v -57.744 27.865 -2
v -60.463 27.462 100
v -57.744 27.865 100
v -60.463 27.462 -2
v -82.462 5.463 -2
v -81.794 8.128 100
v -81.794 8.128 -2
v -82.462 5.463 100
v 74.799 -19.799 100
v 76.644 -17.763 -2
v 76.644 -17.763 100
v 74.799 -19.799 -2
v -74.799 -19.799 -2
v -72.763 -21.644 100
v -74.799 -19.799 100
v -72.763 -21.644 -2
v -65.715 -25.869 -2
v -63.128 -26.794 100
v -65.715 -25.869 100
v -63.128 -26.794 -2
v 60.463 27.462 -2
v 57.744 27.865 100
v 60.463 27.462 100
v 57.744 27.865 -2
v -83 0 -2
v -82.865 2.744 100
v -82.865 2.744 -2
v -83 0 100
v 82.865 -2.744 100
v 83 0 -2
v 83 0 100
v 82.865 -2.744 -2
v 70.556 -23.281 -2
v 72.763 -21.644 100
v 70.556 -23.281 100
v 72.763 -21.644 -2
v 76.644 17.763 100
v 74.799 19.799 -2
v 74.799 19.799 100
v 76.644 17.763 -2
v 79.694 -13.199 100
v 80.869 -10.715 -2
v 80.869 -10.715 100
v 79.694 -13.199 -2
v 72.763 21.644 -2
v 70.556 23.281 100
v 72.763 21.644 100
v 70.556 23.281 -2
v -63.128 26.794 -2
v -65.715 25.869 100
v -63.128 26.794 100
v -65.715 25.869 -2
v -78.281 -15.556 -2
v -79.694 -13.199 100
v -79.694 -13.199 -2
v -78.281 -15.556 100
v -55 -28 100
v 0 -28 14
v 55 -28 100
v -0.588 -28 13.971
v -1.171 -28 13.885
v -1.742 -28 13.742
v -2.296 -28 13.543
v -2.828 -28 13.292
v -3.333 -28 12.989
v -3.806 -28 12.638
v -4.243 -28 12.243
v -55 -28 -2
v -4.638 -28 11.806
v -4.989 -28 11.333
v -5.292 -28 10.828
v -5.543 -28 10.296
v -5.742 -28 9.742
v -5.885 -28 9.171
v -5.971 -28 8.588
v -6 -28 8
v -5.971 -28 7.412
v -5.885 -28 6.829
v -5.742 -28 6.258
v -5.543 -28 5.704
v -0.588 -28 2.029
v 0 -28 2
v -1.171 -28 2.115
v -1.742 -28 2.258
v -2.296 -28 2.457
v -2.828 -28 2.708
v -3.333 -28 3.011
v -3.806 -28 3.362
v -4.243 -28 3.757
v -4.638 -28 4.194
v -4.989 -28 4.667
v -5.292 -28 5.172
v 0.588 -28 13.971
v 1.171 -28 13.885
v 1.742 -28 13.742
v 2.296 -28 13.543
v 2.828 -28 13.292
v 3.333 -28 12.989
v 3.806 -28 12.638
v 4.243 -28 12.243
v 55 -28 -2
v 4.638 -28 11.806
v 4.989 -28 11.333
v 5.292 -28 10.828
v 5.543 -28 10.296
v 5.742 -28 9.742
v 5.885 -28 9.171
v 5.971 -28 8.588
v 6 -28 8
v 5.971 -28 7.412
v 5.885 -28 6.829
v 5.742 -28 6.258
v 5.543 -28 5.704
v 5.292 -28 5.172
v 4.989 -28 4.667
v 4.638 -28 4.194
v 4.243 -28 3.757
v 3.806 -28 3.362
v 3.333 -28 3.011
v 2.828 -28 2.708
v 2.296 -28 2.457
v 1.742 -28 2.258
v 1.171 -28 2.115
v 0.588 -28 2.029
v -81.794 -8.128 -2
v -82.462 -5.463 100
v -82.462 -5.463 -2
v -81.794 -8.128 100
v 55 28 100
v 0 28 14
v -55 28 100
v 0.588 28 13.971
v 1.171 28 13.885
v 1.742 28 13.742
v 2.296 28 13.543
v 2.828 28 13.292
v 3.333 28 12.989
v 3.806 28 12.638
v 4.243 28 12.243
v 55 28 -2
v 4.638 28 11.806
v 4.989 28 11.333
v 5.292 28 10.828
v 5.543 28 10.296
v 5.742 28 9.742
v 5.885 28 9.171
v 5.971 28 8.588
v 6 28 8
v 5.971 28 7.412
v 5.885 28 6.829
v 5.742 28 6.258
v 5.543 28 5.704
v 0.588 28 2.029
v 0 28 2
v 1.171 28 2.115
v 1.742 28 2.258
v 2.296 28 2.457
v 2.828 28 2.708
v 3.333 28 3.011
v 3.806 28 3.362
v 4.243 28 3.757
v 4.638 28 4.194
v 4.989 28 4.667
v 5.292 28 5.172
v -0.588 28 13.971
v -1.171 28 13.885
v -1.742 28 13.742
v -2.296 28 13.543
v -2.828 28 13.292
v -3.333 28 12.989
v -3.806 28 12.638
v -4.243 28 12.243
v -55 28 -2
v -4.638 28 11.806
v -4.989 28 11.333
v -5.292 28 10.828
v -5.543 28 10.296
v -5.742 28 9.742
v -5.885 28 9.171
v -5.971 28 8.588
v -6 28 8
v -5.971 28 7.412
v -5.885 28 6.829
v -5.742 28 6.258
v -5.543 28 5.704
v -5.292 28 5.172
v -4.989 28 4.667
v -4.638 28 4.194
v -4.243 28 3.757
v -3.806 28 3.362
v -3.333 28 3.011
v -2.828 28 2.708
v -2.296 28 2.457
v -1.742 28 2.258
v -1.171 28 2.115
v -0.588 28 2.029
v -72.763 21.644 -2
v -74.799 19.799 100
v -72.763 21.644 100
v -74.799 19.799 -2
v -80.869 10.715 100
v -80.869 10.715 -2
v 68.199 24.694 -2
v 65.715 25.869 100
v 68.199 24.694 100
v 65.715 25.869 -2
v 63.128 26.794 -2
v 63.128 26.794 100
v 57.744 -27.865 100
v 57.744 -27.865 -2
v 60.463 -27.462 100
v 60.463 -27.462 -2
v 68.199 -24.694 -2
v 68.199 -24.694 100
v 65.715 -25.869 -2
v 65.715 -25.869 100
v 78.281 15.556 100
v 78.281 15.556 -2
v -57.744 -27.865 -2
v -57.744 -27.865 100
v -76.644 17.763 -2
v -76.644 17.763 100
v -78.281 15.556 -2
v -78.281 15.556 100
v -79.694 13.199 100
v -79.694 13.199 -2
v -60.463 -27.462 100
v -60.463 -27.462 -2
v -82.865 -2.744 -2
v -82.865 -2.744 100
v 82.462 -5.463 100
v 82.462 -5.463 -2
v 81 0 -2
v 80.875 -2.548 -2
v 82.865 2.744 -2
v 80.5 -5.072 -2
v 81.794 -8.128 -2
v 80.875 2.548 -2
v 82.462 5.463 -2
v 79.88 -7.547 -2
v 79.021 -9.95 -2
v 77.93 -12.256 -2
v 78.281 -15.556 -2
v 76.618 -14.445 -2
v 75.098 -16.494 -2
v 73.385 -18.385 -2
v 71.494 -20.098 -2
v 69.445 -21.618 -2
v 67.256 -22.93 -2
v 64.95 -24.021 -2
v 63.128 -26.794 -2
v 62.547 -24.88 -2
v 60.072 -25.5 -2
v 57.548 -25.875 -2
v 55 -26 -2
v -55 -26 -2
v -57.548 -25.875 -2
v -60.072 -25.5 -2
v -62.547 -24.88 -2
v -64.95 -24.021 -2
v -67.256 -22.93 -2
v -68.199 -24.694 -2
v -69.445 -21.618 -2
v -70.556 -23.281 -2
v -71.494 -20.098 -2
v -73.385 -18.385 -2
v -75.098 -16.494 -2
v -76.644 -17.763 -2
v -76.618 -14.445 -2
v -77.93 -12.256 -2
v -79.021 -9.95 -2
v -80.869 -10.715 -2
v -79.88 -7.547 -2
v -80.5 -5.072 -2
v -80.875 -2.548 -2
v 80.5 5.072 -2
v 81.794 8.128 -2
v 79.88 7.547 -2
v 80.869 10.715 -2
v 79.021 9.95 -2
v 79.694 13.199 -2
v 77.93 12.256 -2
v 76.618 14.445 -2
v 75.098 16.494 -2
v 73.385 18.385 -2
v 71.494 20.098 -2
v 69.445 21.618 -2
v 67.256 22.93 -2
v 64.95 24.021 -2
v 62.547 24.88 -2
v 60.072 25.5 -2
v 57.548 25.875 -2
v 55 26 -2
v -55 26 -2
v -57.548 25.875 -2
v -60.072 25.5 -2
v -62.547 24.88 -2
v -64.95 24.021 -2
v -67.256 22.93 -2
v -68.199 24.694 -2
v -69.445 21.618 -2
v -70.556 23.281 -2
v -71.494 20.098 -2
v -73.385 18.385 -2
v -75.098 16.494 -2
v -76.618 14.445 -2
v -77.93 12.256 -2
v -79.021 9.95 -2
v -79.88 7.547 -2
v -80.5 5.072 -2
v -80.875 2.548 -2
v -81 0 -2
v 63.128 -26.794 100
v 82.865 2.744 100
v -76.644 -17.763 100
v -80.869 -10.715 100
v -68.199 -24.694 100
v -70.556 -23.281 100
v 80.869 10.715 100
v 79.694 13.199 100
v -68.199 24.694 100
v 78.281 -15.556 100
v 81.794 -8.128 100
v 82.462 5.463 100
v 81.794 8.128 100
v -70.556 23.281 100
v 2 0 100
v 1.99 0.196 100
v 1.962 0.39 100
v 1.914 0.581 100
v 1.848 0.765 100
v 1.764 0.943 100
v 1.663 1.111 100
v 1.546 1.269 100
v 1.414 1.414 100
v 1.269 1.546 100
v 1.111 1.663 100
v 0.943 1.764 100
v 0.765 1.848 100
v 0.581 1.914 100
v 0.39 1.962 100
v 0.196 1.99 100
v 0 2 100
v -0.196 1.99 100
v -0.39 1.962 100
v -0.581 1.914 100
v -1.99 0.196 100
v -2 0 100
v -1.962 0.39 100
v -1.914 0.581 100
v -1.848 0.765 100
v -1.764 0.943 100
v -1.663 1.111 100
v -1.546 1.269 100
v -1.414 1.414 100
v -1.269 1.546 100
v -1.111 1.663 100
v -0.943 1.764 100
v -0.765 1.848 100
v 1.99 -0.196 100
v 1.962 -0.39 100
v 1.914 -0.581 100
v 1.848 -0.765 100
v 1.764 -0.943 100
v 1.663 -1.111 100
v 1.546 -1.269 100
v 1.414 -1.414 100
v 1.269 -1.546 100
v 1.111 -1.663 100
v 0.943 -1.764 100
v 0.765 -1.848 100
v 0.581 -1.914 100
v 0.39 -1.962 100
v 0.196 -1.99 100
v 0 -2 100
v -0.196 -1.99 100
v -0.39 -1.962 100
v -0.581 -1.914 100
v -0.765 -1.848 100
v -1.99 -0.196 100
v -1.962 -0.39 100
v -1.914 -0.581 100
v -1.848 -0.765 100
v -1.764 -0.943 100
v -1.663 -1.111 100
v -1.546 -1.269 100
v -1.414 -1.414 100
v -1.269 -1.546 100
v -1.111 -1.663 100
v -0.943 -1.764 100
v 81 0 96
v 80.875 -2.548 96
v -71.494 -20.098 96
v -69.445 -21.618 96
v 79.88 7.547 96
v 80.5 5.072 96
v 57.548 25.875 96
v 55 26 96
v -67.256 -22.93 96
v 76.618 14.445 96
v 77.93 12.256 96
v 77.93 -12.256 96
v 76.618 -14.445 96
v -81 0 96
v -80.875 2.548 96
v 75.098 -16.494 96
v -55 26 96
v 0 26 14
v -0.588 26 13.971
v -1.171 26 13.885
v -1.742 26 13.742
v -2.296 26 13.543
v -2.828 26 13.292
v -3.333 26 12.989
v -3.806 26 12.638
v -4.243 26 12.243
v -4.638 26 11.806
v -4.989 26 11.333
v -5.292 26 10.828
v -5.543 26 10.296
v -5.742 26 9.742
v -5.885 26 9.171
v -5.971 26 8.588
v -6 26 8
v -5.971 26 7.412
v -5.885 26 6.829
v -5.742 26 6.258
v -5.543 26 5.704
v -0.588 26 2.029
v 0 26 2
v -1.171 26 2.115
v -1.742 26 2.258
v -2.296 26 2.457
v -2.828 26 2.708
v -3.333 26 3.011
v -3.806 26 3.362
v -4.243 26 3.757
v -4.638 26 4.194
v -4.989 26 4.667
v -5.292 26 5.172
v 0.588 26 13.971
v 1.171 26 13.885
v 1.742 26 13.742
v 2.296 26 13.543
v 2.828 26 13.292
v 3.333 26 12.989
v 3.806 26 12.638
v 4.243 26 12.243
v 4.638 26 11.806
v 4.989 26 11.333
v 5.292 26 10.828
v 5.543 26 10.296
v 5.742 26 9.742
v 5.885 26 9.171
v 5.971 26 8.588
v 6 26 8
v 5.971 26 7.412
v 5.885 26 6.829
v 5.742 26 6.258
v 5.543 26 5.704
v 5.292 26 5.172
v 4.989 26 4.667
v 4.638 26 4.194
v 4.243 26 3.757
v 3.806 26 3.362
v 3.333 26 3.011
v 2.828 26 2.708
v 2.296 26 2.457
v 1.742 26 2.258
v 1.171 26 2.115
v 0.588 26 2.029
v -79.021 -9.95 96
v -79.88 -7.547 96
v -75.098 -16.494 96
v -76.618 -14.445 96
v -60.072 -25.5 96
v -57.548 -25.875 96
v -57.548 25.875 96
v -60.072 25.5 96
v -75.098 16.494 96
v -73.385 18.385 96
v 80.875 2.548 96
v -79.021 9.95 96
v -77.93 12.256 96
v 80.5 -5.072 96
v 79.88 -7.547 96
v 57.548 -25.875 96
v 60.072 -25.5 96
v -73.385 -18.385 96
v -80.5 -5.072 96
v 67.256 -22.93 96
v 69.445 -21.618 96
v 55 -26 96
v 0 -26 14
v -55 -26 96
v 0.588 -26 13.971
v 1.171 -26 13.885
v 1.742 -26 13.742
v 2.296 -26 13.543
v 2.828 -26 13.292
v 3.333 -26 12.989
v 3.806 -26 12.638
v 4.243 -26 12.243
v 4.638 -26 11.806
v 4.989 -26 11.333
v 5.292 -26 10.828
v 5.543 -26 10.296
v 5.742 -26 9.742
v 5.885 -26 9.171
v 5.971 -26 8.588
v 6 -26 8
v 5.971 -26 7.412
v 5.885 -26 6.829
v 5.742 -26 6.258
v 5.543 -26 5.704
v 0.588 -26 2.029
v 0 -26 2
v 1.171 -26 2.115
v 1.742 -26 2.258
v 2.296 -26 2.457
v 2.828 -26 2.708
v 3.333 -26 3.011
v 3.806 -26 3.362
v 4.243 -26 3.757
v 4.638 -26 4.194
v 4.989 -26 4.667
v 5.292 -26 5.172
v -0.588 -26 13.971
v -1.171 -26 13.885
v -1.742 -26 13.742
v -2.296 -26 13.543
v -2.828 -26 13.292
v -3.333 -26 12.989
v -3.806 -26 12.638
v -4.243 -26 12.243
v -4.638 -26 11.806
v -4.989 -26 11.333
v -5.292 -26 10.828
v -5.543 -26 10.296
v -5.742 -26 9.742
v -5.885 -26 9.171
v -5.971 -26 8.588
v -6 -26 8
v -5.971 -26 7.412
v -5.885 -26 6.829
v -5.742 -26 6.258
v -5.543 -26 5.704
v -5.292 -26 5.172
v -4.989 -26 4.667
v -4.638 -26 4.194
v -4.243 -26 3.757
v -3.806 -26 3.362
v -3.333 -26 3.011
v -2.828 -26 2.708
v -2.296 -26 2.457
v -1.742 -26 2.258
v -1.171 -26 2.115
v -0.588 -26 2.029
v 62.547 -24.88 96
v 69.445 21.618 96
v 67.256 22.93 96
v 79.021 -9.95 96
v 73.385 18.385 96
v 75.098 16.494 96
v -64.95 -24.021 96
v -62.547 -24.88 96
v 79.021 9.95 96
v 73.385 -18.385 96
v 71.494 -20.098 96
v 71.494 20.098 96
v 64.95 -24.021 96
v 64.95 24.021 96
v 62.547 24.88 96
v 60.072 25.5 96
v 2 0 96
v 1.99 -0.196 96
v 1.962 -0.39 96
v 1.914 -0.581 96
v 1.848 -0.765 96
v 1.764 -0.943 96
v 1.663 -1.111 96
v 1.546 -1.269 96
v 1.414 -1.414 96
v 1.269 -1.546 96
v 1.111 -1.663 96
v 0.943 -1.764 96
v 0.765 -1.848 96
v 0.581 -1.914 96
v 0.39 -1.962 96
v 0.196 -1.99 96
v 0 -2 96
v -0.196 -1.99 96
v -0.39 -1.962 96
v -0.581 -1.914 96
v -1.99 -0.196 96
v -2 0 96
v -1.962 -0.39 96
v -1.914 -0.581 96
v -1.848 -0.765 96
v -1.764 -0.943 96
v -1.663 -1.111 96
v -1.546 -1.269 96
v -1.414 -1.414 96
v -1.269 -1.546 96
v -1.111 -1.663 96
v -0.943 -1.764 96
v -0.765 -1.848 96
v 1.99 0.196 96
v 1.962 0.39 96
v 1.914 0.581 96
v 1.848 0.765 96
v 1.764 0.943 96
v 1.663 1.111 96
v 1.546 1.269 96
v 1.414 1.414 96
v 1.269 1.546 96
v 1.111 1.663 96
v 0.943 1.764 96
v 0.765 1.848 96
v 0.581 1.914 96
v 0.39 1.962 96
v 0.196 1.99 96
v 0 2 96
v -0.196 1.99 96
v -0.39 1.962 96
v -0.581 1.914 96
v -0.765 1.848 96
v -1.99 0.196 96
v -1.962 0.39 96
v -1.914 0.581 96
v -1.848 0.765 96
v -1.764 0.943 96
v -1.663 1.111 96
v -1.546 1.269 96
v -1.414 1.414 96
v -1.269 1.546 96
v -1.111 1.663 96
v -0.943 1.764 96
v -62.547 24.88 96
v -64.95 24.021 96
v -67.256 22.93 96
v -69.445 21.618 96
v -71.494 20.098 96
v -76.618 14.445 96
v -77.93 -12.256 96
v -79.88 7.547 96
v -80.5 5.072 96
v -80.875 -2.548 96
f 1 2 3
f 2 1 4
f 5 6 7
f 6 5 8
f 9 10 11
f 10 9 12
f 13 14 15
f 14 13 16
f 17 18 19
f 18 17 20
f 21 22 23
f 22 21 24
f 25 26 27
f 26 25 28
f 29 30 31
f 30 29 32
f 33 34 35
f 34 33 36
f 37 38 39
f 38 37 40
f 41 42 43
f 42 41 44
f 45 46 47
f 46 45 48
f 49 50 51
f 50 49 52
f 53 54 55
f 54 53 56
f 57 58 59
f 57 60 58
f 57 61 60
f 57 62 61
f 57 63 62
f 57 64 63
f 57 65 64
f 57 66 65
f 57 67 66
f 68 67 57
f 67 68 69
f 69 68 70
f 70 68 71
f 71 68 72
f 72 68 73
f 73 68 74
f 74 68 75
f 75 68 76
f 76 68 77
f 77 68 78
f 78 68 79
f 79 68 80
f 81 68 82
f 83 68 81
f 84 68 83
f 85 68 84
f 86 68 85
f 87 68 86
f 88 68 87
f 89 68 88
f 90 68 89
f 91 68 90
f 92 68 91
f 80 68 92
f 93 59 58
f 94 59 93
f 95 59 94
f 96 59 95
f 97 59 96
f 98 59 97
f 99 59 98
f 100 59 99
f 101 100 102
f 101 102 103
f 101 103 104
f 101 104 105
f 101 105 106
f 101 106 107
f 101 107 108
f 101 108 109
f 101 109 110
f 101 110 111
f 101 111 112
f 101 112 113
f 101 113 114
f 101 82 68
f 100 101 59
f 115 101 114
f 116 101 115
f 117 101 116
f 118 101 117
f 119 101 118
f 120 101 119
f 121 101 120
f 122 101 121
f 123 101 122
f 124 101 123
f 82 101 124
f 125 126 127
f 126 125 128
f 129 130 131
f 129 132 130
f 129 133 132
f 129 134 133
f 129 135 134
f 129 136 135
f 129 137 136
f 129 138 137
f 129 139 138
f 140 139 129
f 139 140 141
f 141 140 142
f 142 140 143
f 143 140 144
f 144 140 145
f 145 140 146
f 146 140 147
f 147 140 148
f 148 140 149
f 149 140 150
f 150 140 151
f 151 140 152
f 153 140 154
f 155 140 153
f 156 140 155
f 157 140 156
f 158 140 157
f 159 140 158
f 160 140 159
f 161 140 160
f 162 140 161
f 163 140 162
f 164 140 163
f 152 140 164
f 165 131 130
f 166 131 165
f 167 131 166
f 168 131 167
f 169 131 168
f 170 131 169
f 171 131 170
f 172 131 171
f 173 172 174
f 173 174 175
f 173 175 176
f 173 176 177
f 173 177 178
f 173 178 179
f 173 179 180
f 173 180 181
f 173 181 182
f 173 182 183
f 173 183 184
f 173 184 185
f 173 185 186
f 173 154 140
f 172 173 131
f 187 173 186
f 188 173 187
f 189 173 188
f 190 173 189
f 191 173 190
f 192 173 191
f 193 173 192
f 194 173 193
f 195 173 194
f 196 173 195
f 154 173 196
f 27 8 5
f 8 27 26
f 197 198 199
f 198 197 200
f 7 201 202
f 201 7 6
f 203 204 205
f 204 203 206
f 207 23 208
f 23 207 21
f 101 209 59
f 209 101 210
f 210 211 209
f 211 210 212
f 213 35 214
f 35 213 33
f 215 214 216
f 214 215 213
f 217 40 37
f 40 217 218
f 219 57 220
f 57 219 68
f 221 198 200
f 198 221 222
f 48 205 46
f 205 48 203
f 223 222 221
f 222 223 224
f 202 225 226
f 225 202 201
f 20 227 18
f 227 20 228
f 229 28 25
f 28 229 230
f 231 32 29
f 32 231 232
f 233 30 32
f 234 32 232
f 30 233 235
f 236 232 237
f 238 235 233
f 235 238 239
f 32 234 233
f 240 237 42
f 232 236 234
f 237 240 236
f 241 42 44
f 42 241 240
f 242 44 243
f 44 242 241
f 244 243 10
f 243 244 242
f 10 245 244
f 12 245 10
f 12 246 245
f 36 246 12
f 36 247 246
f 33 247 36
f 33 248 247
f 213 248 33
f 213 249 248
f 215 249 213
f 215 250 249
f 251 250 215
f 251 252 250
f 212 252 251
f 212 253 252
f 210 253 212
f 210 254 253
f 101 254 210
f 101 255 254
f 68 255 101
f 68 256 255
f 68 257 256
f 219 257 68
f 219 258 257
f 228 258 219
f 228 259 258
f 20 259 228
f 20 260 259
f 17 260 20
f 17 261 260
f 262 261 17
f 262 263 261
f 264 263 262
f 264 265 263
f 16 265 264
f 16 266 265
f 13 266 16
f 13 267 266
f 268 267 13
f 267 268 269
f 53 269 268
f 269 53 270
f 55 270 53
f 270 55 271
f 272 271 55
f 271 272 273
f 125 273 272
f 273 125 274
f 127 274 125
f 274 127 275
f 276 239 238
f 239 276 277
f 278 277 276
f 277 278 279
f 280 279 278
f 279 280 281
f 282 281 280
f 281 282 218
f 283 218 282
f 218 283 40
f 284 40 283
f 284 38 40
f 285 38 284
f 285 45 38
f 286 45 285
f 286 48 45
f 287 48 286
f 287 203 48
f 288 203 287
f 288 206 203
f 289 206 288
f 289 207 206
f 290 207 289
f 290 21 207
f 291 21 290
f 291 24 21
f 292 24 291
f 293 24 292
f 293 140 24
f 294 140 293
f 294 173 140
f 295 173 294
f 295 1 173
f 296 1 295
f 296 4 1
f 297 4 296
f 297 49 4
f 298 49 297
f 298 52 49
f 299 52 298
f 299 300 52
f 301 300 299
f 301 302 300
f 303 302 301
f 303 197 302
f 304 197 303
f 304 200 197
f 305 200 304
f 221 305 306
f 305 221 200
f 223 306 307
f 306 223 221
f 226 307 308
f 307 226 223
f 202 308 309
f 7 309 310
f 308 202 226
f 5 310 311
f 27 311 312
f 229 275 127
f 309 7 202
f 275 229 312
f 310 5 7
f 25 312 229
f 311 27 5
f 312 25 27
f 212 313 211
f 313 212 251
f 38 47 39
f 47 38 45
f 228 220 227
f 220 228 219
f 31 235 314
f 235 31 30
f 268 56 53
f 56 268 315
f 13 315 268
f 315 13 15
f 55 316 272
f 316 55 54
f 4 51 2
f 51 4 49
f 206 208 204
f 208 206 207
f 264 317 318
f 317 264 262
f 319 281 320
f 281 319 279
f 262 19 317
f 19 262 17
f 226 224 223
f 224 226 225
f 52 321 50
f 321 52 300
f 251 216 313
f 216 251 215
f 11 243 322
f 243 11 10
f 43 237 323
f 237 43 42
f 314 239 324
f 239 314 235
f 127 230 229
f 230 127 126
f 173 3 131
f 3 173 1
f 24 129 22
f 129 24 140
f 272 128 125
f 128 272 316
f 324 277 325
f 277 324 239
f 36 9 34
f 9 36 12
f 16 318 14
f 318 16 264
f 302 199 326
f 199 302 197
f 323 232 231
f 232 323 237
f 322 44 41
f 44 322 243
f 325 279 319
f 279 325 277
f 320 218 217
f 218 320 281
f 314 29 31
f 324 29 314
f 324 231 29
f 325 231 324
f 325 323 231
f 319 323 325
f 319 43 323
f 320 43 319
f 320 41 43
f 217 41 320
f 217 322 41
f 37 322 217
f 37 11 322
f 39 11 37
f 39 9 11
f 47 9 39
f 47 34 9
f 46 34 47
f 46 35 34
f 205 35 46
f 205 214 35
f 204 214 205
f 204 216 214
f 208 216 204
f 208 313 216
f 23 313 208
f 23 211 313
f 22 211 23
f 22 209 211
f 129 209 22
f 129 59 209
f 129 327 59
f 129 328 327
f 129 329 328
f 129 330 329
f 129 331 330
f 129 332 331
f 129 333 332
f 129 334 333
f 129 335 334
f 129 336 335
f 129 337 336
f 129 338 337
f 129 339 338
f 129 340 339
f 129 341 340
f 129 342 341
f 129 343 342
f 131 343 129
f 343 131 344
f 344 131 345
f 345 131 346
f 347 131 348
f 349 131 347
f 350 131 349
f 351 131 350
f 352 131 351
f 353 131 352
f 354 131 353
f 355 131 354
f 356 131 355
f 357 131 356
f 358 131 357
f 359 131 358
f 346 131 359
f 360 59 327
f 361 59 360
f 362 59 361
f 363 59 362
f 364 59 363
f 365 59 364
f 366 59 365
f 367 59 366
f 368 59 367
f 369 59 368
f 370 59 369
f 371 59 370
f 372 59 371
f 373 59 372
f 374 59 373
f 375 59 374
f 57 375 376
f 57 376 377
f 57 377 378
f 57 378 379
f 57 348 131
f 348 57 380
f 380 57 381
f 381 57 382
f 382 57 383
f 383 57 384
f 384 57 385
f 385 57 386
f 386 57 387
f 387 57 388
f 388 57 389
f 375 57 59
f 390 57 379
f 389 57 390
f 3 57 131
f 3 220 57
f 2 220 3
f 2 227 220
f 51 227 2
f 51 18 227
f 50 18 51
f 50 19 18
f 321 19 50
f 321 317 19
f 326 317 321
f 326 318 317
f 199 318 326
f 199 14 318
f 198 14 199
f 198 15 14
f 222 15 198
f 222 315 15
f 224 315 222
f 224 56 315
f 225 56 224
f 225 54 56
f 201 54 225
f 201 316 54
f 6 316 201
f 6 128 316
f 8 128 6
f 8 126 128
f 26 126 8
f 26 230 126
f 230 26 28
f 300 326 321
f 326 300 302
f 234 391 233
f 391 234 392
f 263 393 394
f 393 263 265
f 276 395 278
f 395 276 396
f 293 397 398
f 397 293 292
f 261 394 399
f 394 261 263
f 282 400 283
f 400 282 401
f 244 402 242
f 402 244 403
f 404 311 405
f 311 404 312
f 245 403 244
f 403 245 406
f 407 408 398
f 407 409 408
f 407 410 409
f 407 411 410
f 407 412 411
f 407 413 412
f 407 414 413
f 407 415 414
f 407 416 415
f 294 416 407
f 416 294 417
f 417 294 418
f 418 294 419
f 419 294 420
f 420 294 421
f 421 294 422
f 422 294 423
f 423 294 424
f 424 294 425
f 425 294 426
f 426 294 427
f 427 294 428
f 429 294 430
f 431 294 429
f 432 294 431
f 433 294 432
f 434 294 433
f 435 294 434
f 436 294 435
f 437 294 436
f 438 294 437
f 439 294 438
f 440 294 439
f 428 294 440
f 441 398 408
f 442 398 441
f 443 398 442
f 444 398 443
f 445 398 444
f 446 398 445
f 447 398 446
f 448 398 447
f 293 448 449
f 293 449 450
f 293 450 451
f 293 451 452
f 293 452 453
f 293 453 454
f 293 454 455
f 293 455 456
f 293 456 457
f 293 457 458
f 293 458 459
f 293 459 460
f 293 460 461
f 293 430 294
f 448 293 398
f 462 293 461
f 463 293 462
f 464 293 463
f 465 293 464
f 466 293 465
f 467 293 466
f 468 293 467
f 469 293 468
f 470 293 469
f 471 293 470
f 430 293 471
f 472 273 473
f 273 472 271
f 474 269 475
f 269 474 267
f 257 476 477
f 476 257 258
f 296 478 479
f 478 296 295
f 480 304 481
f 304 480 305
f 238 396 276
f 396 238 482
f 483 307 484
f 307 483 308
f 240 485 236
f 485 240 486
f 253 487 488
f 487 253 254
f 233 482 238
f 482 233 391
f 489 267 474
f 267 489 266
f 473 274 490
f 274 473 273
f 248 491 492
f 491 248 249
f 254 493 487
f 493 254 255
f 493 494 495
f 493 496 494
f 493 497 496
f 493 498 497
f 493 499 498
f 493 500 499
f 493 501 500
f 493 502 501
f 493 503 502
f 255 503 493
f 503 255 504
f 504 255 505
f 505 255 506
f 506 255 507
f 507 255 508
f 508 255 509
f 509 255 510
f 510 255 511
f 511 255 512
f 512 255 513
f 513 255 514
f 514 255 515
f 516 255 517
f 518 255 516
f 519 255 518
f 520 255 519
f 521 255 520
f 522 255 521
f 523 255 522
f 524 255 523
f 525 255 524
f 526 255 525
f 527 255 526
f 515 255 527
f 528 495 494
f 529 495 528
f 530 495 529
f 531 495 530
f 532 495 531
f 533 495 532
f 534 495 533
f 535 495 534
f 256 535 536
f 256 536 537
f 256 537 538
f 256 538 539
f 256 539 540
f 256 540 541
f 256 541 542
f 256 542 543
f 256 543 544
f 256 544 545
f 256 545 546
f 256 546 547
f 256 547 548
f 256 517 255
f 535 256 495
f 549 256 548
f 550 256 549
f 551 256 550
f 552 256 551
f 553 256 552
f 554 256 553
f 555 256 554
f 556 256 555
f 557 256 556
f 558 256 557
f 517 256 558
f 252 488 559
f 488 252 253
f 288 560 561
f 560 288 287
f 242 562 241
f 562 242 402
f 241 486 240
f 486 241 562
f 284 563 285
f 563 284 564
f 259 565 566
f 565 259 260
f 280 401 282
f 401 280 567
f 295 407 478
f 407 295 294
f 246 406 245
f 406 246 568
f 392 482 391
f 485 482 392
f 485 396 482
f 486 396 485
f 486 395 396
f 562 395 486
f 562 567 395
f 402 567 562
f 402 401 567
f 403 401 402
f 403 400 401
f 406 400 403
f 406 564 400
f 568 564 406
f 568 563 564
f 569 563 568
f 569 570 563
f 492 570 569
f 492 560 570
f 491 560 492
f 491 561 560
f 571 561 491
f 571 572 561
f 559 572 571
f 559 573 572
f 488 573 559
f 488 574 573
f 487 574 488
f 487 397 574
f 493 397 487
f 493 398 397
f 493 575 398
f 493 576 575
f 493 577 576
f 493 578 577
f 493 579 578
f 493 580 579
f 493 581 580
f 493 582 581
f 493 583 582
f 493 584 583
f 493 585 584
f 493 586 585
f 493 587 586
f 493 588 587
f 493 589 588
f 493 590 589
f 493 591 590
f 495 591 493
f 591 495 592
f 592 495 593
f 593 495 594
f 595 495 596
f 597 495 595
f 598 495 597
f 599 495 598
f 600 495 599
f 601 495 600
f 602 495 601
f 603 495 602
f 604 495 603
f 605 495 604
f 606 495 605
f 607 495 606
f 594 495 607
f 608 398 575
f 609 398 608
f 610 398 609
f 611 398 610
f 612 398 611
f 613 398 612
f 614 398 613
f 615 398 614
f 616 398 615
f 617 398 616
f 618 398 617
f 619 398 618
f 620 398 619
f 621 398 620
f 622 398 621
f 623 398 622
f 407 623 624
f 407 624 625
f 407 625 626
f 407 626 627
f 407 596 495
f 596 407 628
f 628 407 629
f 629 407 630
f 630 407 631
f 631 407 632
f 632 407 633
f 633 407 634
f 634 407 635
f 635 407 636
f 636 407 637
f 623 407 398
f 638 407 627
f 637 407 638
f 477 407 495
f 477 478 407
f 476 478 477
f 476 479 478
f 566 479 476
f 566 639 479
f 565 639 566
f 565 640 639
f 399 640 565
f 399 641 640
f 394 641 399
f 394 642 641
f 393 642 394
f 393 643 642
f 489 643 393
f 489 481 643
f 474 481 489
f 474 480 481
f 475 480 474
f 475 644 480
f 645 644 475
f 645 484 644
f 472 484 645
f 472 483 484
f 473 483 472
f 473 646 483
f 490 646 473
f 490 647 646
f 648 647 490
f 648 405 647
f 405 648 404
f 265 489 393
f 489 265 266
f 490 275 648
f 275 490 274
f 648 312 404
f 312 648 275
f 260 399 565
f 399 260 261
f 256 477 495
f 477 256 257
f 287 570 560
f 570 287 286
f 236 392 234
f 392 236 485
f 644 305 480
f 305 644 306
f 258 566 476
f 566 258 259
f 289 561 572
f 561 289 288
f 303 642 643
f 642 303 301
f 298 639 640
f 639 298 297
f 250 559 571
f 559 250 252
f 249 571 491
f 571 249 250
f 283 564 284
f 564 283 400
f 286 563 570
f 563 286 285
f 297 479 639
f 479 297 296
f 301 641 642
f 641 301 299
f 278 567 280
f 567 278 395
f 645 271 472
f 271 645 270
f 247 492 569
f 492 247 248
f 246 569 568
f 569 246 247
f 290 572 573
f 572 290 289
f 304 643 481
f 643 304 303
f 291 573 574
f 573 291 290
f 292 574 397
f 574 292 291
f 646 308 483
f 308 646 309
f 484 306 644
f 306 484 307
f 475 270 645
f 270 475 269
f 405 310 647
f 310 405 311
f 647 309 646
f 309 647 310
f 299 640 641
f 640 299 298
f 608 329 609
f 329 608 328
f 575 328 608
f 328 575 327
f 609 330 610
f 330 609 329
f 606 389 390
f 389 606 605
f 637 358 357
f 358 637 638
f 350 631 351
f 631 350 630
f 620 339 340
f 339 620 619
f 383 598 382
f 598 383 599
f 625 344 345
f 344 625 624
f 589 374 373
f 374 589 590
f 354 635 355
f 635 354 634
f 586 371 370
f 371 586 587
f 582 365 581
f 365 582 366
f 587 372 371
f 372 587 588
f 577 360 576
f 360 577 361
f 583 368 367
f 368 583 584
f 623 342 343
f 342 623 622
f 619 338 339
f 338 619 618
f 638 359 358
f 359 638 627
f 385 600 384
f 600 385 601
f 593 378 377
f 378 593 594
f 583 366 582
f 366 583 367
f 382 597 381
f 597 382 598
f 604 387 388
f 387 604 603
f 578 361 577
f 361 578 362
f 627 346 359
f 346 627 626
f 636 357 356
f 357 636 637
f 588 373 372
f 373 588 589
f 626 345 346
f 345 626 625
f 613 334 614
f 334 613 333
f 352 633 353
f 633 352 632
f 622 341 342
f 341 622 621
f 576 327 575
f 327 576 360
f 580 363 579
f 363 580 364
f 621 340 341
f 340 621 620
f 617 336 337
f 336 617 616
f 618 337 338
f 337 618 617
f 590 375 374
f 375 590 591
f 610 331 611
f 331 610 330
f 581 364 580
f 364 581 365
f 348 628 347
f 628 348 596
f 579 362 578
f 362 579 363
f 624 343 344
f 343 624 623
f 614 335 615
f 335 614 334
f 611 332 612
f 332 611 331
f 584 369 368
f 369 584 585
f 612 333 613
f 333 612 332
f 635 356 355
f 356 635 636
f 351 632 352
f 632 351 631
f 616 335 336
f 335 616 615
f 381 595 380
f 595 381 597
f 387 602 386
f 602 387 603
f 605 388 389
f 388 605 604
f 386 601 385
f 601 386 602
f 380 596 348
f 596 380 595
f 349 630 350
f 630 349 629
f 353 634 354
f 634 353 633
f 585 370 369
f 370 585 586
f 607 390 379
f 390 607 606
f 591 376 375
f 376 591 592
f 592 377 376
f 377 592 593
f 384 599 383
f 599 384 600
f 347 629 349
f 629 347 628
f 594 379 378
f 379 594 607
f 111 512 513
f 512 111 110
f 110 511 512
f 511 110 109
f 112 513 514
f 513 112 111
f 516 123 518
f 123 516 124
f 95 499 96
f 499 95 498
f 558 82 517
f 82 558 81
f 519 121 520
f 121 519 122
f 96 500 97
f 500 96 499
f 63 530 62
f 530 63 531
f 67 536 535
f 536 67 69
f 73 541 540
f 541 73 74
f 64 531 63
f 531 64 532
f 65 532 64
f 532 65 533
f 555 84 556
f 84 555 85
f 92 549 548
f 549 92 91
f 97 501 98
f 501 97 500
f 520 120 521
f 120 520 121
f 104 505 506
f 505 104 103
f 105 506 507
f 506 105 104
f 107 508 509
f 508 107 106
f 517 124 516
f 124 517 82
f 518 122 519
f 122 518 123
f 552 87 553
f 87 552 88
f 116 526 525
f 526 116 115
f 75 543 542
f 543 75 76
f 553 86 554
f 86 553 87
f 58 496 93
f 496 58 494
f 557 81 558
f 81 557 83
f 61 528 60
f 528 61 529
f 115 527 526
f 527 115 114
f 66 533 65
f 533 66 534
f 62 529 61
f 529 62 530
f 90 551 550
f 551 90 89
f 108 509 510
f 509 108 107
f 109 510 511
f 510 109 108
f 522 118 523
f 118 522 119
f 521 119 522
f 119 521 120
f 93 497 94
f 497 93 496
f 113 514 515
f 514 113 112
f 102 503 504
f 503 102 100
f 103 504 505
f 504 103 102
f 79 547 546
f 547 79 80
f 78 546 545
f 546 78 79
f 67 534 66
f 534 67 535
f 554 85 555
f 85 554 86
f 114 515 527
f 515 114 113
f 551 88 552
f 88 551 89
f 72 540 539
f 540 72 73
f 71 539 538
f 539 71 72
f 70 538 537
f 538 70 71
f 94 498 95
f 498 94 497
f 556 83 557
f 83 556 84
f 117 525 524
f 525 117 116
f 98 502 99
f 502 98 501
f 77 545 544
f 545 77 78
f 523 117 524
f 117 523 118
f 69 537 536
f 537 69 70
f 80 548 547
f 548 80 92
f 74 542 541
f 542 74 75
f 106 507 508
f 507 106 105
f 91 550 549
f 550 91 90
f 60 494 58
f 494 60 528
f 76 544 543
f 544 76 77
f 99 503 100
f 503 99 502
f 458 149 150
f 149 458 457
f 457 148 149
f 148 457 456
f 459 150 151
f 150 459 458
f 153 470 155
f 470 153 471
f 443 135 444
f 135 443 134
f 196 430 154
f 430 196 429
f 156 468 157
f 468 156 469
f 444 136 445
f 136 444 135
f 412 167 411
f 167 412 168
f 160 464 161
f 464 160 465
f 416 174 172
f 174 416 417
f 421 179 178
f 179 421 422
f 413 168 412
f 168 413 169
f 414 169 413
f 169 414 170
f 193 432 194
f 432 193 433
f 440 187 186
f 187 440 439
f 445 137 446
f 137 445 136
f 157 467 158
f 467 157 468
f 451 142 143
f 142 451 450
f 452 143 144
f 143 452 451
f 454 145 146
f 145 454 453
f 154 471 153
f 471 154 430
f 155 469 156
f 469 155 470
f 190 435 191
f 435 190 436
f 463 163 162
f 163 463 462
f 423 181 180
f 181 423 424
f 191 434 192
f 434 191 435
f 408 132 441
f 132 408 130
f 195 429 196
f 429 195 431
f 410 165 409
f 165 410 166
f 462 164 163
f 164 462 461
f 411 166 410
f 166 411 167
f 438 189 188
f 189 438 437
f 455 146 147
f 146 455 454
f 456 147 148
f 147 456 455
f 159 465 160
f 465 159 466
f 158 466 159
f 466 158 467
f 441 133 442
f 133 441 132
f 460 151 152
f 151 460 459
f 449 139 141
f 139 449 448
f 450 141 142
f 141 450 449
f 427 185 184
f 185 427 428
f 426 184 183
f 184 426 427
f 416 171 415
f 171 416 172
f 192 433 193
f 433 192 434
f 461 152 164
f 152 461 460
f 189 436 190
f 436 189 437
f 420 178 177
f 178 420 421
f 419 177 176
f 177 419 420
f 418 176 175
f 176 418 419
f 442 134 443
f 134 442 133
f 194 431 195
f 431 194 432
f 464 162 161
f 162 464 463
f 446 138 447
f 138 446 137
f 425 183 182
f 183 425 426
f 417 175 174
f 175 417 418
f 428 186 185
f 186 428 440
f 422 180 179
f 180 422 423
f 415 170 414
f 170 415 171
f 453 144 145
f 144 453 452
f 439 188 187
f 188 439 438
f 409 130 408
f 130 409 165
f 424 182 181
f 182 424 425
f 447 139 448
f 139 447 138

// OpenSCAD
// =============================================
// Lamp Model
// =============================================

// --- Overall dimensions ---
lamp_width   = 230;  // total length along long axis (mm)
lamp_depth   = 120;  // total depth along short axis (mm)
total_height = 160;  // assembled height base + diffuser (mm)

// --- Base ---
base_height           = 40;   // total base height (mm)
base_floor_thickness  = 15;   // base floor thickness — must clear ESP32 pocket + clip groove (mm)
base_wall_thickness   = 5;    // base side wall thickness (mm) — must exceed diffuser_wall_thickness; difference is tenon width
base_diffuser_overlap               = 10;   // how far the diffuser clamps down over the base top (mm)

// --- Diffuser ---
diffuser_wall_thickness     = 3;  // side wall thickness (mm)
diffuser_top_thickness      = 3;  // top wall thickness — thicker to give 1.5mm under disc pocket (mm)
diffuser_top_roundover      = 2;  // roundover radius on top outer edge (mm)

// --- Copper disc (top button) ---
disc_r             = 40;   // disc radius (mm)
disc_thickness     = 2;    // disc thickness (mm)
disc_pocket_depth  = 1.5;  // pocket depth — disc proud by (disc_thickness - disc_pocket_depth) = 0.5mm

// --- LED form ---
led_gap             = 32;  // inset from outer lamp wall to LED form outer surface (mm)
led_height          = 100; // LED form height (mm)
led_wall_thickness  = 2;   // LED form wall thickness (mm)
led_clip_depth      = 2;   // depth of locating rim that seats into base floor groove (mm)
led_hole_r          = 6;   // radius of cable pass-through holes in LED form walls (mm)

// --- Wire routing ---
wire_r = 2;  // radius of vertical wire channel through diffuser top and LED form (mm)

// --- EC11 rotary encoder (front face) ---
enc_shaft_r     = 3.25; // shaft hole radius — 6.5mm diameter for EC11 (mm)
enc_body_width  = 14;   // encoder body cavity width (mm)
enc_body_depth  = 15;   // encoder body cavity depth into base wall (mm)
enc_body_height = 14;   // encoder body cavity height (mm)

// --- USB-C decoy board (rear face) ---
usbc_port_width   = 9.5;  // USB-C port opening width (mm)
usbc_port_height  = 3.5;  // USB-C port opening height (mm)
usbc_board_width  = 10.7; // board width (mm)
usbc_board_length = 28;   // board length — extends inward from rear wall (mm)
usbc_board_height = 7;    // board + component height — measure and update (mm)

// --- ESP32 board (lies flat on base floor, inside LED form) ---
// Active: ESP32-S3 Pico — swap values below to use WROOM-32D for prototyping
// ESP32-WROOM-32D DevKit: esp_length=52, esp_width=28, esp_component_height=10
esp_length           = 51;   // board length (mm) — verify against datasheet
esp_width            = 21;   // board width  (mm) — verify against datasheet
esp_component_height = 4;    // tallest component height (mm) — verify against datasheet
esp_pocket_depth     = 1.5;  // locating pocket depth in base floor (mm)

// --- Render quality ---
$fn = 64;

// --- Derived (do not edit) ---
diff_h  = total_height - base_height + base_diffuser_overlap;  // diffuser height including base_diffuser_overlap
pill_r  = lamp_depth / 2;                        // end-cap radius of pill shape
pill_cx = (lamp_width - lamp_depth) / 2;         // centre-to-centre half-spacing of pill cylinders
led_r   = pill_r - led_gap;                      // LED form outer radius
enc_z   = (base_height - base_diffuser_overlap) / 2;           // z-centre of encoder shaft and USB-C port


// =============================================
// Helper: pill-shaped hull of two cylinders
// =============================================
module pill(r, h) {
    hull() {
        translate([-pill_cx, 0, 0]) cylinder(r=r, h=h);
        translate([ pill_cx, 0, 0]) cylinder(r=r, h=h);
    }
}


// =============================================
// Diffuser outer shell with top edge roundover.
// Uses minkowski + sphere for true roundover on all
// top edges, then clips the bottom flat.
// =============================================
module diffuser_outer() {
    r = diffuser_top_roundover;
    intersection() {
        minkowski() {
            pill(pill_r - r, diff_h - r);
            sphere(r=r);
        }
        // Clip bottom flat — minkowski expands downward by r
        translate([0, 0, diff_h / 2])
            cube([lamp_width * 2, lamp_depth * 2, diff_h], center=true);
    }
}

// =============================================
// Diffuser
// Hollow pill, open bottom, 3mm side walls, 3mm top.
// Top outer edge has a 2mm roundover.
// Top has a pocket for the copper disc and a
// vertical wire channel routing to the ESP32.
// Print orientation: upright on open bottom.
// =============================================
module diffuser() {
    color("white", 0.85)
    difference() {
        diffuser_outer();

        // Inner cavity — open at bottom, diffuser_top_thickness top wall
        translate([0, 0, -0.1])
            pill(pill_r - diffuser_wall_thickness, diff_h - diffuser_top_thickness + 0.1);

        // Copper disc pocket — disc protrudes 0.5mm proud of top surface
        translate([0, 0, diff_h - disc_pocket_depth])
            cylinder(r=disc_r, h=disc_pocket_depth + 0.1);

        // Vertical wire channel — runs full height, exits through pocket floor
        translate([0, 0, -0.1])
            cylinder(r=wire_r, h=diff_h + 0.2);
    }
}


// =============================================
// Base
// Hollow pill, 3mm side walls, 15mm floor, open top.
// Top base_diffuser_overlap region is stepped to form friction-fit
// tenon for the diffuser.
// Front face (-Y): EC11 encoder shaft hole + body cavity.
// Rear face  (+Y): USB-C port hole + board pocket.
// Floor: ESP32 locating pocket + LED form clip groove.
// Print orientation: upright on floor.
// =============================================
module base() {
    color("#5C3A1E")
    difference() {
        pill(pill_r, base_height);

        // Inner cavity — base_floor_thickness floor, open top
        translate([0, 0, base_floor_thickness])
            pill(pill_r - base_wall_thickness, base_height - base_floor_thickness + 0.1);

        // Friction-fit tenon — steps top base_diffuser_overlap region inward by diffuser_wall_thickness
        // so diffuser inner wall seats flush over the top of the base
        translate([0, 0, base_height - base_diffuser_overlap])
            difference() {
                pill(pill_r + 0.1, base_diffuser_overlap + 0.1);
                pill(pill_r - diffuser_wall_thickness, base_diffuser_overlap + 0.2);
            }

        // EC11 encoder shaft hole — front face (-Y), centred horizontally and vertically
        translate([0, -(pill_r + 0.1), enc_z])
            rotate([-90, 0, 0])
                cylinder(r=enc_shaft_r, h=base_wall_thickness + 5);

        // EC11 encoder body cavity — pocket behind front wall, aligned with shaft
        translate([-enc_body_width/2, -(pill_r - base_wall_thickness), enc_z - enc_body_height/2])
            cube([enc_body_width, enc_body_depth, enc_body_height]);

        // LED form clip groove — ring channel in base floor that the LED form rim seats into
        translate([0, 0, base_floor_thickness - led_clip_depth])
            difference() {
                pill(led_r + 0.1, led_clip_depth + 0.1);
                pill(led_r - led_wall_thickness, led_clip_depth + 0.1);
            }

        // ESP32 locating pocket — centred in base floor, board lies flat
        translate([-esp_length/2, -esp_width/2, base_floor_thickness - esp_pocket_depth])
            cube([esp_length, esp_width, esp_pocket_depth + 0.1]);

        // USB-C port opening — rear face (+Y), aligned vertically with encoder
        translate([-usbc_port_width/2, pill_r - base_wall_thickness - 0.1, enc_z - usbc_port_height/2])
            cube([usbc_port_width, base_wall_thickness + 0.2, usbc_port_height]);

        // USB-C decoy board pocket — friction fit, board drops in from open top
        // connector end at rear wall, board extends inward
        translate([-usbc_board_width/2, pill_r - base_wall_thickness - usbc_board_length, enc_z - usbc_board_height/2])
            cube([usbc_board_width, usbc_board_length, usbc_board_height]);
    }
}


// =============================================
// LED Form
// Hollow pill tube — LED strip winds around outside.
// Bottom rim seats into clip groove in base floor.
// Front and rear walls have cable pass-through holes
// for routing encoder and USB-C wires to the ESP32.
// Print orientation: upright.
// =============================================
module led_form() {
    color("white", 0.4)
    difference() {
        // Outer shell — rim extends led_clip_depth below z=0 to seat in groove
        translate([0, 0, -led_clip_depth])
            pill(led_r, led_height + led_clip_depth);

        // Inner cavity — open bottom, closed top (led_wall_thickness top wall)
        translate([0, 0, -(led_clip_depth + 0.1)])
            pill(led_r - led_wall_thickness, led_height - led_wall_thickness + 0.1);

        // Vertical wire channel — aligns with diffuser wire channel above
        translate([0, 0, -(led_clip_depth + 0.1)])
            cylinder(r=wire_r, h=led_height + led_clip_depth + 0.2);

        // Cable hole — front wall, toward encoder
        translate([0, -(led_r + 0.1), led_hole_r + led_clip_depth])
            rotate([-90, 0, 0])
                cylinder(r=led_hole_r, h=led_wall_thickness + 0.2);

        // Cable hole — rear wall, toward USB-C board
        translate([0, led_r - led_wall_thickness - 0.1, led_hole_r + led_clip_depth])
            rotate([-90, 0, 0])
                cylinder(r=led_hole_r, h=led_wall_thickness + 0.2);
    }
}


// =============================================
// Copper Disc
// Sits in diffuser top pocket, protrudes 0.5mm proud.
// Capacitive touch sensor wired to ESP32 via wire channel.
// =============================================
module copper_disc() {
    color([0.72, 0.45, 0.20])
    cylinder(r=disc_r, h=disc_thickness);
}


// =============================================
// Assembly
// Comment out individual modules to isolate
// parts for slicing / printing.
// =============================================

// Base (z = 0 to base_height)
// base();

// Diffuser — bottom rim seats over base tenon at z = base_height - base_diffuser_overlap
//translate([0, 0, base_height - base_diffuser_overlap])
//    diffuser();

// LED form — rim drops into base floor groove; body rises from z = base_floor_thickness
//translate([0, 0, base_floor_thickness])
    led_form();

// Copper disc — recessed into diffuser top pocket, protrudes 0.5mm above lamp top
//translate([0, 0, (base_height - base_diffuser_overlap) + diff_h - disc_pocket_depth])
//    copper_disc();
